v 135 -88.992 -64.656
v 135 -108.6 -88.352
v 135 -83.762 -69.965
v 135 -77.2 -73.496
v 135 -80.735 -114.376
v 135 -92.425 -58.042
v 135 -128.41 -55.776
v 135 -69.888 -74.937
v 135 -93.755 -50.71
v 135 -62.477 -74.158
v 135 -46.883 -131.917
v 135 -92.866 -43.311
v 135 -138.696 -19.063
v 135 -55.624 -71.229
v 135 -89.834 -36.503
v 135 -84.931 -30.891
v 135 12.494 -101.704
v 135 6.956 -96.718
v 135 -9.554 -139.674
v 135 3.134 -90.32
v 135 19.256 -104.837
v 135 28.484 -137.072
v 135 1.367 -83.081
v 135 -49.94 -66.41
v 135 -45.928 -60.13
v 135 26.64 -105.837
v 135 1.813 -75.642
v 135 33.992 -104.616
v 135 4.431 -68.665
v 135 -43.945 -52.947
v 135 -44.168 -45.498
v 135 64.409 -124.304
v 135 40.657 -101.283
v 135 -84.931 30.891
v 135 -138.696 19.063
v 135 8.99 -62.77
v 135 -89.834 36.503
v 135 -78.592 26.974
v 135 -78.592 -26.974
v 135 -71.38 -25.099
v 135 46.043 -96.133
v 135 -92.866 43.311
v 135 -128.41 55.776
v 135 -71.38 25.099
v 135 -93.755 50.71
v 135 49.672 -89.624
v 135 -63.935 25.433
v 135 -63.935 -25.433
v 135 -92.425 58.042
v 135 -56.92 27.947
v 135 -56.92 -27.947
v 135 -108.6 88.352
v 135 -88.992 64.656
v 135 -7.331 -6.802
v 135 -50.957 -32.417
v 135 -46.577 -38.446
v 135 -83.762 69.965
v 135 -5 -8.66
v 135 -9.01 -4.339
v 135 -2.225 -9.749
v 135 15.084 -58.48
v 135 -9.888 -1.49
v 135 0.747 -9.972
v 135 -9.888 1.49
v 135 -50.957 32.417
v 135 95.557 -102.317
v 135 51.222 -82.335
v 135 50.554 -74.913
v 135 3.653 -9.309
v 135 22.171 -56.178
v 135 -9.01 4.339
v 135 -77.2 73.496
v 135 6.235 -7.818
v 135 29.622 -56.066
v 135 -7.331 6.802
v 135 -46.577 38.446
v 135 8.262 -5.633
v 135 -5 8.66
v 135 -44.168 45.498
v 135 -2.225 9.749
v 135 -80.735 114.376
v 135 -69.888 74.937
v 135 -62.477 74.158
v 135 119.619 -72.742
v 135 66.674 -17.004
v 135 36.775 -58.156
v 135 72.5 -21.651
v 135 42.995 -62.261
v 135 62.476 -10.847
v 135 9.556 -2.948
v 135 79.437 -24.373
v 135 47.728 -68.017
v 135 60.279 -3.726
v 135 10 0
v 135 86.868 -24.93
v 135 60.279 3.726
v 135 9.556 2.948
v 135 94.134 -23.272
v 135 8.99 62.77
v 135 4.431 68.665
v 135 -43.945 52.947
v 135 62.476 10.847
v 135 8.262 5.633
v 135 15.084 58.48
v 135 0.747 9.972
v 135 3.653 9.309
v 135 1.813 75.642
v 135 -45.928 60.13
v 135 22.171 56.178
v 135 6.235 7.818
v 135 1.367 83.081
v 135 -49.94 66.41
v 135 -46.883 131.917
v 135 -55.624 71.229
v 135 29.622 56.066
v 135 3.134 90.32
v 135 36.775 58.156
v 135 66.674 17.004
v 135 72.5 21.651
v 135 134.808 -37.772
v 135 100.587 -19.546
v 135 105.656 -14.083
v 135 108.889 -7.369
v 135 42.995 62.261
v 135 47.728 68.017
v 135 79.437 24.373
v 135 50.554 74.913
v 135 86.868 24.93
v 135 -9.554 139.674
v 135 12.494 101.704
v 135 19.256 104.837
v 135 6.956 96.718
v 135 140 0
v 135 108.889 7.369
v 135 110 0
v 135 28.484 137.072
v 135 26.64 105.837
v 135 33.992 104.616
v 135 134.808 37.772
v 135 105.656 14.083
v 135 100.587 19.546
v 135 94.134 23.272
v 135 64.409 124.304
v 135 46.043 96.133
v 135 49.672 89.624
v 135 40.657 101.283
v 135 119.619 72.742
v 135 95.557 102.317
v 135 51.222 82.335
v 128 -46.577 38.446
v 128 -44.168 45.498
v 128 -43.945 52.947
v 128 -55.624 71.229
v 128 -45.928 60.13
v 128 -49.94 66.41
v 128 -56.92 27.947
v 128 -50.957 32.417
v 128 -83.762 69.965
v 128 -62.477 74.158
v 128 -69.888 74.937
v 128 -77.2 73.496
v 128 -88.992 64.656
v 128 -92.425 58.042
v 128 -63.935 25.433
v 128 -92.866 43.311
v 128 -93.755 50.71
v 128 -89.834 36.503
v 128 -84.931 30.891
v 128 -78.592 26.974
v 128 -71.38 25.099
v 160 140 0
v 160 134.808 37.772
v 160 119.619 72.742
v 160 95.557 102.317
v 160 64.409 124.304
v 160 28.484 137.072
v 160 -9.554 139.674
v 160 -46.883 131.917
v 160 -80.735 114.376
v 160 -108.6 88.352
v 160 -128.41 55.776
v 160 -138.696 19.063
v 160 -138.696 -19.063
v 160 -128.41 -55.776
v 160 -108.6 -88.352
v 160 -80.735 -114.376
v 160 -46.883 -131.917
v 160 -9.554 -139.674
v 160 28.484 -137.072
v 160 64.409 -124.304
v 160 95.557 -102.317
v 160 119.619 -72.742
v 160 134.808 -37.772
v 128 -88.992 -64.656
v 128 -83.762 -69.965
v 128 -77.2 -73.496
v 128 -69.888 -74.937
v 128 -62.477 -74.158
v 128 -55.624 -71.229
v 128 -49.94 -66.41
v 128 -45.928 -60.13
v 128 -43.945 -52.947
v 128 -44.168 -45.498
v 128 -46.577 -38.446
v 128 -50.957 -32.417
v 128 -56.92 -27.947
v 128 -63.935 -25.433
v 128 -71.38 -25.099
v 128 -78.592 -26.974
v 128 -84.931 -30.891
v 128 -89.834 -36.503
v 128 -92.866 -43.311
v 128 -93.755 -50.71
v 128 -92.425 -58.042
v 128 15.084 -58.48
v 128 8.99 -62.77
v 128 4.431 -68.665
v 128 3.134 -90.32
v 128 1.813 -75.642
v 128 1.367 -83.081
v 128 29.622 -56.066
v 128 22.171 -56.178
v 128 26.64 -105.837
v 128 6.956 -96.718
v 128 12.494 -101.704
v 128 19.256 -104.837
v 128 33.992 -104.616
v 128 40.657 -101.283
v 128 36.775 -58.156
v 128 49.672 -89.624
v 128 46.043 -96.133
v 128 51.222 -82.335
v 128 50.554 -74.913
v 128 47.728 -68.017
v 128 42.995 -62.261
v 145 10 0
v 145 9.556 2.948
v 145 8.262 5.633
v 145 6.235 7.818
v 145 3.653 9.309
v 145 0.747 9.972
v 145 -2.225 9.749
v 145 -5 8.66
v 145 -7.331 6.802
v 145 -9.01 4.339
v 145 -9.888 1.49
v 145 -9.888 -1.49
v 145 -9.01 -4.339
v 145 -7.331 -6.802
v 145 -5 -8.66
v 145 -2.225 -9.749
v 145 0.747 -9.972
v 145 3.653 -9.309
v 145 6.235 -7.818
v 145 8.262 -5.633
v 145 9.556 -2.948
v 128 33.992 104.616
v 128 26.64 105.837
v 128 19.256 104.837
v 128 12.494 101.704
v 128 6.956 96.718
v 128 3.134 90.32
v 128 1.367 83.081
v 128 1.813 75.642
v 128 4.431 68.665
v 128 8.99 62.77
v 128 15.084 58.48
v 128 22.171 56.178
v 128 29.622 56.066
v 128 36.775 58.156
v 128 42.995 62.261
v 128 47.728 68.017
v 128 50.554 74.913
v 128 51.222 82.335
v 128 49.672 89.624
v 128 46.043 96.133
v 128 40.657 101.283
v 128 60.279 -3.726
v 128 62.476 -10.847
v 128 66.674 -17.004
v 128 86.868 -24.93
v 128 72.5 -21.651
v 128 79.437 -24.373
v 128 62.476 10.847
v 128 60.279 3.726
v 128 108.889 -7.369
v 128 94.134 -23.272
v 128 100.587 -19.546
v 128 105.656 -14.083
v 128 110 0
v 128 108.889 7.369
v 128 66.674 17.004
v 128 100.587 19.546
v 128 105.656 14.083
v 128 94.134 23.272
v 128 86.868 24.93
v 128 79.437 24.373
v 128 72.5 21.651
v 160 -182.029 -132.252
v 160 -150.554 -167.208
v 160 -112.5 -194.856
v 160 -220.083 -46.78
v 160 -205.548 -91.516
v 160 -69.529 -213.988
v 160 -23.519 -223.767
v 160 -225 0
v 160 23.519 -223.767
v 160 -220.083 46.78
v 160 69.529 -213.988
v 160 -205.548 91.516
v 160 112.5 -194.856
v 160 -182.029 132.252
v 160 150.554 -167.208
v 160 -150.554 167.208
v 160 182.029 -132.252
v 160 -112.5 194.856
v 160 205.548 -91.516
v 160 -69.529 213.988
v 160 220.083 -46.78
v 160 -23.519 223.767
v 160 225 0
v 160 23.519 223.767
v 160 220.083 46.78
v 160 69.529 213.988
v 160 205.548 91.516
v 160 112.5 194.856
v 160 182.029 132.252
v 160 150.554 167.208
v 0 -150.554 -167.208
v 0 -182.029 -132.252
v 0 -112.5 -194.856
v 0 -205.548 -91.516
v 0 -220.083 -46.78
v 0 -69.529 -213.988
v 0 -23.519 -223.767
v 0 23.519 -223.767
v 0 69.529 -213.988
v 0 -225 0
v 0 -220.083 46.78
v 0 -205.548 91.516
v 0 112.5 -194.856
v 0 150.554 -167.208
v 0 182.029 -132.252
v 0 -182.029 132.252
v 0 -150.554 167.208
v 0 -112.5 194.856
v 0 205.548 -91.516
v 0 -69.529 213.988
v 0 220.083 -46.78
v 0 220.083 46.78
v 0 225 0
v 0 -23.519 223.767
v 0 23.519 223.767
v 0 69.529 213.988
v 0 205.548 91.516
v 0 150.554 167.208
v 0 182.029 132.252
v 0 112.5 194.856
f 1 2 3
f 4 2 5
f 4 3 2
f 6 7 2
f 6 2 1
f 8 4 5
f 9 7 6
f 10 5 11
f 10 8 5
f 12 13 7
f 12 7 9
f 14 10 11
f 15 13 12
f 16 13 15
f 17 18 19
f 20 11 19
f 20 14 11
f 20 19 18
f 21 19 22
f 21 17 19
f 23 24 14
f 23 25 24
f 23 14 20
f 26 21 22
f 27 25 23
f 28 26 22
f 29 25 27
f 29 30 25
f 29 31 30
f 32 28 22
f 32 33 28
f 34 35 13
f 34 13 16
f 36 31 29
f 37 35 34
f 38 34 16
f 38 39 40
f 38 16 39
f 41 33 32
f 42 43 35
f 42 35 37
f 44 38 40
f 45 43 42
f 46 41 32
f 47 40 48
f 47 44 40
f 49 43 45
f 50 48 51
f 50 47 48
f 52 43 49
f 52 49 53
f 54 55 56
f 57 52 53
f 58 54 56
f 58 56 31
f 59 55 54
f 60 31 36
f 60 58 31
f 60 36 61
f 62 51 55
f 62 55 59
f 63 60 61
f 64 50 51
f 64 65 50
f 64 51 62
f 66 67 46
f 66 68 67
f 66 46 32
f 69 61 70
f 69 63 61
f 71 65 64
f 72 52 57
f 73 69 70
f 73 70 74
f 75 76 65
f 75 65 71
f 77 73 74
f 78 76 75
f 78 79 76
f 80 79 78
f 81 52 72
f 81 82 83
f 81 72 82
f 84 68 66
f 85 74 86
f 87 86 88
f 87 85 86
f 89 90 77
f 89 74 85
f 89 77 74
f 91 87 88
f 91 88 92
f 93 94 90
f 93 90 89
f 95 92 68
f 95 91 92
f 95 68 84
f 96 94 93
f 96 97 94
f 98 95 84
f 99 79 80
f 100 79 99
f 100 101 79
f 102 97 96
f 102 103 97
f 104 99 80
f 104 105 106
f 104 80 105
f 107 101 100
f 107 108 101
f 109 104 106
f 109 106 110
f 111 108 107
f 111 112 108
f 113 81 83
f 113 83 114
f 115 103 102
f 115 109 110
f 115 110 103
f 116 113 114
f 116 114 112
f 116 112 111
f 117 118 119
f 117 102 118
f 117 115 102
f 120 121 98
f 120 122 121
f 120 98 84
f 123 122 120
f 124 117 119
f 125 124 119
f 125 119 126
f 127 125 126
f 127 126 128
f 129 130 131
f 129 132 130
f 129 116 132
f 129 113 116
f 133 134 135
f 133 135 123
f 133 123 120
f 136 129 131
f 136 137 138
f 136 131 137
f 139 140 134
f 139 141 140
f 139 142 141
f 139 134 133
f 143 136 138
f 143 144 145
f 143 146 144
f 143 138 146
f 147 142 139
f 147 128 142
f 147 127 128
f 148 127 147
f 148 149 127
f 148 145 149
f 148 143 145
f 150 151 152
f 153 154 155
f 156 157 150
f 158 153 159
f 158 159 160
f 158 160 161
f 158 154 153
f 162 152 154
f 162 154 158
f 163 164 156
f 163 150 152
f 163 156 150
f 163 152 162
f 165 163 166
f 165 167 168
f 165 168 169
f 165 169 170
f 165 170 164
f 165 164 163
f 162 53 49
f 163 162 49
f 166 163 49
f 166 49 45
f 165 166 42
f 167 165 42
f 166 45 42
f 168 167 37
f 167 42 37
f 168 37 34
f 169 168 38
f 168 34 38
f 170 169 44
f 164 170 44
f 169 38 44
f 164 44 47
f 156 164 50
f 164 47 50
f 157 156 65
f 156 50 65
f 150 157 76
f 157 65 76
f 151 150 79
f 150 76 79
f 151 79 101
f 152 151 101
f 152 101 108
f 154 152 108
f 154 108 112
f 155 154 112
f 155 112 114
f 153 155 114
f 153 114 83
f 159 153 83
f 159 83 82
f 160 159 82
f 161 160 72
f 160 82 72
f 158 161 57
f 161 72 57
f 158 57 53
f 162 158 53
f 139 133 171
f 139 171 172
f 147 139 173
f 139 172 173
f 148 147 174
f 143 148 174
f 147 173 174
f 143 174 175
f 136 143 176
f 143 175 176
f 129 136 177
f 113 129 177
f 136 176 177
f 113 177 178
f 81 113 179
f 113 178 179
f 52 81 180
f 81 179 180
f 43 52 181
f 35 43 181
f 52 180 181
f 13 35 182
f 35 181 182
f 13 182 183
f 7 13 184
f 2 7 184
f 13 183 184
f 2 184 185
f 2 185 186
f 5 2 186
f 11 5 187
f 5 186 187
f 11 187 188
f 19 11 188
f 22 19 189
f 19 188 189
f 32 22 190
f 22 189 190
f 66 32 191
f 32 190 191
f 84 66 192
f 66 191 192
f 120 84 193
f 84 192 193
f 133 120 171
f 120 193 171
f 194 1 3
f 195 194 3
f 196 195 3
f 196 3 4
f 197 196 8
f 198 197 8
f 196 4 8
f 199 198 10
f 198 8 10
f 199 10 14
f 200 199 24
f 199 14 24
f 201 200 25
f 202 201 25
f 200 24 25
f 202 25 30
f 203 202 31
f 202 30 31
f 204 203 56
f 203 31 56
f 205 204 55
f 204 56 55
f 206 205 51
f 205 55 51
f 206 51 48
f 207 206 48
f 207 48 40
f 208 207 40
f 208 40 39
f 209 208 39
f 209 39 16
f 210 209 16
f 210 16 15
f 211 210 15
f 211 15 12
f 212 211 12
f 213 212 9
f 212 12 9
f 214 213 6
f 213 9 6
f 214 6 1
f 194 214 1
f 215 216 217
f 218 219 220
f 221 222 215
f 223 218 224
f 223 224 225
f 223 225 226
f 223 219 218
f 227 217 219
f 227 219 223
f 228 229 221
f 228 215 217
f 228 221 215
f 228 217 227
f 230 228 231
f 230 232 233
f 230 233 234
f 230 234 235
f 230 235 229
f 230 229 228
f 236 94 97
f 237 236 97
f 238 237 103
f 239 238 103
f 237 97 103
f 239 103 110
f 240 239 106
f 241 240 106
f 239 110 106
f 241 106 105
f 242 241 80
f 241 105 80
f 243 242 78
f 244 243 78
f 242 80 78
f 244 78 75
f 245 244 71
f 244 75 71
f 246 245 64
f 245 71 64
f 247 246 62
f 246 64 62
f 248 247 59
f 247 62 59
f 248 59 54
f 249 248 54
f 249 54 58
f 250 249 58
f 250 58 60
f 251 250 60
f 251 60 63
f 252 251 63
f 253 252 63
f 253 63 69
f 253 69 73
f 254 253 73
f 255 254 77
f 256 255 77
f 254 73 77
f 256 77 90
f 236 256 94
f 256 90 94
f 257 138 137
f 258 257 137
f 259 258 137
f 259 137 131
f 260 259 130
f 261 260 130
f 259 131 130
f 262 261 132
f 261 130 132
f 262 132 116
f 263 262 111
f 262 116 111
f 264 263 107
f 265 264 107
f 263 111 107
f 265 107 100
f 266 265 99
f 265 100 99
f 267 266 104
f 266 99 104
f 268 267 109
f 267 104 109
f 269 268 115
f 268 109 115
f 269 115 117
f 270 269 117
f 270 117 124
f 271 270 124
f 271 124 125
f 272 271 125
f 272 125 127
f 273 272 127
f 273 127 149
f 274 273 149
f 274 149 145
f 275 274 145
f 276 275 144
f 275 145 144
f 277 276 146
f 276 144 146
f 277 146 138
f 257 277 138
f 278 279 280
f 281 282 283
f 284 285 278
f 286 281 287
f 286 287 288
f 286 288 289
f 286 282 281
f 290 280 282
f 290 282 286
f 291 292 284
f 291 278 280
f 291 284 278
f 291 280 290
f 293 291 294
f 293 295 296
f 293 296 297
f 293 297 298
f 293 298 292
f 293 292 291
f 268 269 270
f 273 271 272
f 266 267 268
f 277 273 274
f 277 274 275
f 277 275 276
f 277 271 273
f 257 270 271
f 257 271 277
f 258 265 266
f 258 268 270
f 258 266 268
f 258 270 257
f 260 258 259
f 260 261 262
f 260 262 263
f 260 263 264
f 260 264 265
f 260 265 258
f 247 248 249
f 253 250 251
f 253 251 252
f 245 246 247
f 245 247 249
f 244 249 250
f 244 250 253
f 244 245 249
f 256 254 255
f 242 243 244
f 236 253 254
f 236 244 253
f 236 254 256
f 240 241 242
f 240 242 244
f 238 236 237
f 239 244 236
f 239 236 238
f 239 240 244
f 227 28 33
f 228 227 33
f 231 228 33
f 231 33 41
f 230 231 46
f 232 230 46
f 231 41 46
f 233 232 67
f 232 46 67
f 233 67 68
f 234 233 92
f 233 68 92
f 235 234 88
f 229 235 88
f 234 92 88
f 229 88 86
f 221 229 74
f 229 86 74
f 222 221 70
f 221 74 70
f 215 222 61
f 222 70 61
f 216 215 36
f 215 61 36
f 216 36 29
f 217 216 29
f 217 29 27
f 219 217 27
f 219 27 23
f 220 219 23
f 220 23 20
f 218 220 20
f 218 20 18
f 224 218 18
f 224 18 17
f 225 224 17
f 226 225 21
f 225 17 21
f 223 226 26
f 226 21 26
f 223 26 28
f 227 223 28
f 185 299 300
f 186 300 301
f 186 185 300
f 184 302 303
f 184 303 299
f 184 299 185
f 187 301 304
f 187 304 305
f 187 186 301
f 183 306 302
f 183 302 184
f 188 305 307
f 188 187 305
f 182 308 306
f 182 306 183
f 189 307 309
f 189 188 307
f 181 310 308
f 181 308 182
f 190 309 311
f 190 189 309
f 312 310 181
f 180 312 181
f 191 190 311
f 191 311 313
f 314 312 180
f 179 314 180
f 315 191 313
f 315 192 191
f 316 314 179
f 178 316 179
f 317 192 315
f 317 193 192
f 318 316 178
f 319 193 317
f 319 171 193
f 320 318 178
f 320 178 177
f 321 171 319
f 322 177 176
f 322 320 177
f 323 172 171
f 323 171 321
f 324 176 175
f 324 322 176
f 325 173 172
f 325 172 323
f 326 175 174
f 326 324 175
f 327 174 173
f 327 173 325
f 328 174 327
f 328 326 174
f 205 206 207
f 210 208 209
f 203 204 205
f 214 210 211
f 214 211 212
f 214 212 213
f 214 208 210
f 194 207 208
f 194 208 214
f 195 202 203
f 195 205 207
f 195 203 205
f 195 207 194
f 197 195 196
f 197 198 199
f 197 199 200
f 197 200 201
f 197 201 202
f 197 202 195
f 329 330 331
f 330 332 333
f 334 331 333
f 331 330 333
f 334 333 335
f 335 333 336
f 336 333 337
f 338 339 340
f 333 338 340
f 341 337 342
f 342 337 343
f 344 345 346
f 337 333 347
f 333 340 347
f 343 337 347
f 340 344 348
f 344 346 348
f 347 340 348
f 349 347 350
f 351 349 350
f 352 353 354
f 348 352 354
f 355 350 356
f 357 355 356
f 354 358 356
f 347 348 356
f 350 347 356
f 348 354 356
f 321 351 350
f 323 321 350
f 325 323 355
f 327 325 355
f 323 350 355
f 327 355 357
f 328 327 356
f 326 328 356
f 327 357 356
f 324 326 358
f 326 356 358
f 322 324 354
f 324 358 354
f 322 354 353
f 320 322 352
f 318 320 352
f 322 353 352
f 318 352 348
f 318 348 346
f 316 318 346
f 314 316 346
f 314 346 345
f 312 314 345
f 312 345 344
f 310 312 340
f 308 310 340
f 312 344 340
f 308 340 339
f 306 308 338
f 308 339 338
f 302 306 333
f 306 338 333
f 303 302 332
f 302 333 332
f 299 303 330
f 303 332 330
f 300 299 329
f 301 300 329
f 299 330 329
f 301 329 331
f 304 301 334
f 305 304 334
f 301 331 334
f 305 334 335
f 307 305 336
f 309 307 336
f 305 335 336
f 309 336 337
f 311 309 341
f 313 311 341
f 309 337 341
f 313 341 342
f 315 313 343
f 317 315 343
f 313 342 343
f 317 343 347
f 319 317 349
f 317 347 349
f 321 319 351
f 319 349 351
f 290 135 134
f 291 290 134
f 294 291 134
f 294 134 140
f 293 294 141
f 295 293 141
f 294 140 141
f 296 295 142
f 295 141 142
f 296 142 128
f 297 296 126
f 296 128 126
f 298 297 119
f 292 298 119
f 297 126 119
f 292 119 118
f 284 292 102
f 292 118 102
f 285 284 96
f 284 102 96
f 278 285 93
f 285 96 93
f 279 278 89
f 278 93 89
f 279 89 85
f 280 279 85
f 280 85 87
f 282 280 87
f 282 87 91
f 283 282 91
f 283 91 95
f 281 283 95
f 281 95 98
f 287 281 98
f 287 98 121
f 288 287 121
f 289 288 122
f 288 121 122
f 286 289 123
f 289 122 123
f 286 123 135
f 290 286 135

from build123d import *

# Parameters (mm, degrees)
F3_R            = 225
F4_DEPTH        = 160
F5_R            = 140
F6_DEPTH        = 25
F7_R            = 25
F8_DEPTH        = 7
F8_COPIES_COUNT = 5
F9_R            = 10
F10_DEPTH       = 10


# Not quite as in the source:
# - a pattern or mirror of a feature is missing from the dataset's text; its kind, count and spacing are read off the source's solid


with BuildPart() as f4:
    # F3 (on Right) → F4 (new body)
    with BuildSketch(Plane.YZ):
        Circle(F3_R)
    extrude(amount=F4_DEPTH)

    # F5 (on face) → F6 (cut)
    with BuildSketch(Plane.YZ.offset(160)):
        Circle(F5_R)
    extrude(amount=-F6_DEPTH, mode=Mode.SUBTRACT)

    # F7 (on face) → F8 (cut)
    with BuildSketch(Plane.YZ.offset(135)):
        with Locations((85, 0)):
            Circle(F7_R)
    f8 = extrude(amount=-F8_DEPTH, mode=Mode.SUBTRACT)

    # F8_copies: F8 ×5 about axis
    f8_copies_axis = Axis((0, 0, 0), (1, 0, 0))
    for i in range(1, F8_COPIES_COUNT):
        add(f8.rotate(f8_copies_axis, i * 360 / F8_COPIES_COUNT), mode=Mode.SUBTRACT)

    # F9 (on face) → F10 (join)
    with BuildSketch(Plane.YZ.offset(135)):
        Circle(F9_R)
    extrude(amount=F10_DEPTH)


solid = f4.part
